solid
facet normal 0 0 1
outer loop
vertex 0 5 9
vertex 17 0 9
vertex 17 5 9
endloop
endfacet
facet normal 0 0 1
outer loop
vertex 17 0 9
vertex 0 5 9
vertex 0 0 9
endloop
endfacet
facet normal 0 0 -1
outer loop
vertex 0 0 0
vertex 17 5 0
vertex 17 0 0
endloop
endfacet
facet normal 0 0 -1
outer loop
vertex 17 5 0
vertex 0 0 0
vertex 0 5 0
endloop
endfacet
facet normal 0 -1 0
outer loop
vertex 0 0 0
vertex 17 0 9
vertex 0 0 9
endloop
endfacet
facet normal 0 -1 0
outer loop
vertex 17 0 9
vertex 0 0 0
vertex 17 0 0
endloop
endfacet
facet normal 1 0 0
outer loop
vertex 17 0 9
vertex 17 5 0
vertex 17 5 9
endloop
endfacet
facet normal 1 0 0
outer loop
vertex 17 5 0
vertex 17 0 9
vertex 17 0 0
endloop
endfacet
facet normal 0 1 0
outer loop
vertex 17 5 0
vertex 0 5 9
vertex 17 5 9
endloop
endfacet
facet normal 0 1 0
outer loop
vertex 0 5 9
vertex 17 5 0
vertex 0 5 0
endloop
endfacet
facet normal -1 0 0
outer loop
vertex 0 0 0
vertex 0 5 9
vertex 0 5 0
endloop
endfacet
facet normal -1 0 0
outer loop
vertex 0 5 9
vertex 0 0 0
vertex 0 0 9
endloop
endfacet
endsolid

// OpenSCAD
// Generated by SolidPython 1.0.1 on 2020-07-29 00:46:56


cube(size = [17, 5, 9]);
/***********************************************
*********      SolidPython code:      **********
************************************************
 
# import packages: SolidPython
from solid import *
from solid.utils import *
from itertools import chain, combinations, permutations


class Resize:

    def __init__(self, scad_file):
        self.scad_file = scad_file
        #self.scad_file = import_scad(scad_file)
        # cone/cylinder param:
        self.r1 = 0
        self.r2 = 0
        self.h = 0
        # rectangular prism param:
        self.w = 0
        self.l = 0
        # ellipse param:
        self.r = 0

    # import OpenScad code (file name corresponds to shape)


    # classify shape + parameters
    def assign(self, param1, param2, param3):
        if self.scad_file == 'cone.scad':
            self.r1 = param1
            self.r2 = param2
            self.h = param3
        elif self.scad_file == 'cylinder.scad':
            self.r1 = param1
            self.r2 = param2
            self.h = param3
        elif self.scad_file == 'rectangularPrism.scad':
            self.h = param1
            self.l = param2
            self.w = param3
        else:
            self.r = param1
            self.h = param2

    # resize parameters
    def iterate(self):
        x = range(3, 20, 2)
        i = 1
        if self.scad_file == 'cone.scad':
            tempList = list(permutations(x, 2))
            for temp in tempList:
                param1 = temp[0]
                param2 = temp[1]
                filepath = 'produced_scad_files/' + 'cone' + str(param1) + '_' + str(param2) + '_' + '.scad'
                scad_render_to_file(cylinder(h=param1, r1=param2, r2=0), filepath)

        elif self.scad_file == 'cylinder.scad':
            tempList = list(permutations(x, 3))
            for temp in tempList:
                param1 = temp[0]
                param2 = temp[1]
                filepath = 'produced_scad_files/' + 'cylinder' + str(param1) + '_' + str(param2) + '_' + '.scad'
                scad_render_to_file(cylinder(h=param1, r1=param2, r2=param2), filepath)

        elif self.scad_file == 'rectangularPrism.scad':
            tempList = list(permutations(x, 3))
            for temp in tempList:
                param1 = temp[0]
                param2 = temp[1]
                param3 = temp[2]
                filepath = 'produced_scad_files/' + 'rectangularPrism' + str(param1) + '_' + str(param2) + '_' + str(
                    param3) + '.scad'
                scad_render_to_file(cube(size=(param1, param2, param3)), filepath)

        elif self.scad_file == 'ellipse.scad':
            tempList = list(permutations(x, 4))
            for temp in tempList:
                param1 = temp[0]
                param2 = temp[1]
                param3 = temp[2]
                param4 = temp[3]
                filepath = 'produced_scad_files/' + 'ellipse' + str(param1) + '_' + str(param2) + '_' + str(param3) + '_' + str(param4) + '.scad'
                scad_render_to_file(scale([param1, param2, param3])(sphere(r=param4)), filepath)

    def render_to_scadfile(self):
        scad_render_to_file(scad, 'example.scad') 
 
************************************************/
